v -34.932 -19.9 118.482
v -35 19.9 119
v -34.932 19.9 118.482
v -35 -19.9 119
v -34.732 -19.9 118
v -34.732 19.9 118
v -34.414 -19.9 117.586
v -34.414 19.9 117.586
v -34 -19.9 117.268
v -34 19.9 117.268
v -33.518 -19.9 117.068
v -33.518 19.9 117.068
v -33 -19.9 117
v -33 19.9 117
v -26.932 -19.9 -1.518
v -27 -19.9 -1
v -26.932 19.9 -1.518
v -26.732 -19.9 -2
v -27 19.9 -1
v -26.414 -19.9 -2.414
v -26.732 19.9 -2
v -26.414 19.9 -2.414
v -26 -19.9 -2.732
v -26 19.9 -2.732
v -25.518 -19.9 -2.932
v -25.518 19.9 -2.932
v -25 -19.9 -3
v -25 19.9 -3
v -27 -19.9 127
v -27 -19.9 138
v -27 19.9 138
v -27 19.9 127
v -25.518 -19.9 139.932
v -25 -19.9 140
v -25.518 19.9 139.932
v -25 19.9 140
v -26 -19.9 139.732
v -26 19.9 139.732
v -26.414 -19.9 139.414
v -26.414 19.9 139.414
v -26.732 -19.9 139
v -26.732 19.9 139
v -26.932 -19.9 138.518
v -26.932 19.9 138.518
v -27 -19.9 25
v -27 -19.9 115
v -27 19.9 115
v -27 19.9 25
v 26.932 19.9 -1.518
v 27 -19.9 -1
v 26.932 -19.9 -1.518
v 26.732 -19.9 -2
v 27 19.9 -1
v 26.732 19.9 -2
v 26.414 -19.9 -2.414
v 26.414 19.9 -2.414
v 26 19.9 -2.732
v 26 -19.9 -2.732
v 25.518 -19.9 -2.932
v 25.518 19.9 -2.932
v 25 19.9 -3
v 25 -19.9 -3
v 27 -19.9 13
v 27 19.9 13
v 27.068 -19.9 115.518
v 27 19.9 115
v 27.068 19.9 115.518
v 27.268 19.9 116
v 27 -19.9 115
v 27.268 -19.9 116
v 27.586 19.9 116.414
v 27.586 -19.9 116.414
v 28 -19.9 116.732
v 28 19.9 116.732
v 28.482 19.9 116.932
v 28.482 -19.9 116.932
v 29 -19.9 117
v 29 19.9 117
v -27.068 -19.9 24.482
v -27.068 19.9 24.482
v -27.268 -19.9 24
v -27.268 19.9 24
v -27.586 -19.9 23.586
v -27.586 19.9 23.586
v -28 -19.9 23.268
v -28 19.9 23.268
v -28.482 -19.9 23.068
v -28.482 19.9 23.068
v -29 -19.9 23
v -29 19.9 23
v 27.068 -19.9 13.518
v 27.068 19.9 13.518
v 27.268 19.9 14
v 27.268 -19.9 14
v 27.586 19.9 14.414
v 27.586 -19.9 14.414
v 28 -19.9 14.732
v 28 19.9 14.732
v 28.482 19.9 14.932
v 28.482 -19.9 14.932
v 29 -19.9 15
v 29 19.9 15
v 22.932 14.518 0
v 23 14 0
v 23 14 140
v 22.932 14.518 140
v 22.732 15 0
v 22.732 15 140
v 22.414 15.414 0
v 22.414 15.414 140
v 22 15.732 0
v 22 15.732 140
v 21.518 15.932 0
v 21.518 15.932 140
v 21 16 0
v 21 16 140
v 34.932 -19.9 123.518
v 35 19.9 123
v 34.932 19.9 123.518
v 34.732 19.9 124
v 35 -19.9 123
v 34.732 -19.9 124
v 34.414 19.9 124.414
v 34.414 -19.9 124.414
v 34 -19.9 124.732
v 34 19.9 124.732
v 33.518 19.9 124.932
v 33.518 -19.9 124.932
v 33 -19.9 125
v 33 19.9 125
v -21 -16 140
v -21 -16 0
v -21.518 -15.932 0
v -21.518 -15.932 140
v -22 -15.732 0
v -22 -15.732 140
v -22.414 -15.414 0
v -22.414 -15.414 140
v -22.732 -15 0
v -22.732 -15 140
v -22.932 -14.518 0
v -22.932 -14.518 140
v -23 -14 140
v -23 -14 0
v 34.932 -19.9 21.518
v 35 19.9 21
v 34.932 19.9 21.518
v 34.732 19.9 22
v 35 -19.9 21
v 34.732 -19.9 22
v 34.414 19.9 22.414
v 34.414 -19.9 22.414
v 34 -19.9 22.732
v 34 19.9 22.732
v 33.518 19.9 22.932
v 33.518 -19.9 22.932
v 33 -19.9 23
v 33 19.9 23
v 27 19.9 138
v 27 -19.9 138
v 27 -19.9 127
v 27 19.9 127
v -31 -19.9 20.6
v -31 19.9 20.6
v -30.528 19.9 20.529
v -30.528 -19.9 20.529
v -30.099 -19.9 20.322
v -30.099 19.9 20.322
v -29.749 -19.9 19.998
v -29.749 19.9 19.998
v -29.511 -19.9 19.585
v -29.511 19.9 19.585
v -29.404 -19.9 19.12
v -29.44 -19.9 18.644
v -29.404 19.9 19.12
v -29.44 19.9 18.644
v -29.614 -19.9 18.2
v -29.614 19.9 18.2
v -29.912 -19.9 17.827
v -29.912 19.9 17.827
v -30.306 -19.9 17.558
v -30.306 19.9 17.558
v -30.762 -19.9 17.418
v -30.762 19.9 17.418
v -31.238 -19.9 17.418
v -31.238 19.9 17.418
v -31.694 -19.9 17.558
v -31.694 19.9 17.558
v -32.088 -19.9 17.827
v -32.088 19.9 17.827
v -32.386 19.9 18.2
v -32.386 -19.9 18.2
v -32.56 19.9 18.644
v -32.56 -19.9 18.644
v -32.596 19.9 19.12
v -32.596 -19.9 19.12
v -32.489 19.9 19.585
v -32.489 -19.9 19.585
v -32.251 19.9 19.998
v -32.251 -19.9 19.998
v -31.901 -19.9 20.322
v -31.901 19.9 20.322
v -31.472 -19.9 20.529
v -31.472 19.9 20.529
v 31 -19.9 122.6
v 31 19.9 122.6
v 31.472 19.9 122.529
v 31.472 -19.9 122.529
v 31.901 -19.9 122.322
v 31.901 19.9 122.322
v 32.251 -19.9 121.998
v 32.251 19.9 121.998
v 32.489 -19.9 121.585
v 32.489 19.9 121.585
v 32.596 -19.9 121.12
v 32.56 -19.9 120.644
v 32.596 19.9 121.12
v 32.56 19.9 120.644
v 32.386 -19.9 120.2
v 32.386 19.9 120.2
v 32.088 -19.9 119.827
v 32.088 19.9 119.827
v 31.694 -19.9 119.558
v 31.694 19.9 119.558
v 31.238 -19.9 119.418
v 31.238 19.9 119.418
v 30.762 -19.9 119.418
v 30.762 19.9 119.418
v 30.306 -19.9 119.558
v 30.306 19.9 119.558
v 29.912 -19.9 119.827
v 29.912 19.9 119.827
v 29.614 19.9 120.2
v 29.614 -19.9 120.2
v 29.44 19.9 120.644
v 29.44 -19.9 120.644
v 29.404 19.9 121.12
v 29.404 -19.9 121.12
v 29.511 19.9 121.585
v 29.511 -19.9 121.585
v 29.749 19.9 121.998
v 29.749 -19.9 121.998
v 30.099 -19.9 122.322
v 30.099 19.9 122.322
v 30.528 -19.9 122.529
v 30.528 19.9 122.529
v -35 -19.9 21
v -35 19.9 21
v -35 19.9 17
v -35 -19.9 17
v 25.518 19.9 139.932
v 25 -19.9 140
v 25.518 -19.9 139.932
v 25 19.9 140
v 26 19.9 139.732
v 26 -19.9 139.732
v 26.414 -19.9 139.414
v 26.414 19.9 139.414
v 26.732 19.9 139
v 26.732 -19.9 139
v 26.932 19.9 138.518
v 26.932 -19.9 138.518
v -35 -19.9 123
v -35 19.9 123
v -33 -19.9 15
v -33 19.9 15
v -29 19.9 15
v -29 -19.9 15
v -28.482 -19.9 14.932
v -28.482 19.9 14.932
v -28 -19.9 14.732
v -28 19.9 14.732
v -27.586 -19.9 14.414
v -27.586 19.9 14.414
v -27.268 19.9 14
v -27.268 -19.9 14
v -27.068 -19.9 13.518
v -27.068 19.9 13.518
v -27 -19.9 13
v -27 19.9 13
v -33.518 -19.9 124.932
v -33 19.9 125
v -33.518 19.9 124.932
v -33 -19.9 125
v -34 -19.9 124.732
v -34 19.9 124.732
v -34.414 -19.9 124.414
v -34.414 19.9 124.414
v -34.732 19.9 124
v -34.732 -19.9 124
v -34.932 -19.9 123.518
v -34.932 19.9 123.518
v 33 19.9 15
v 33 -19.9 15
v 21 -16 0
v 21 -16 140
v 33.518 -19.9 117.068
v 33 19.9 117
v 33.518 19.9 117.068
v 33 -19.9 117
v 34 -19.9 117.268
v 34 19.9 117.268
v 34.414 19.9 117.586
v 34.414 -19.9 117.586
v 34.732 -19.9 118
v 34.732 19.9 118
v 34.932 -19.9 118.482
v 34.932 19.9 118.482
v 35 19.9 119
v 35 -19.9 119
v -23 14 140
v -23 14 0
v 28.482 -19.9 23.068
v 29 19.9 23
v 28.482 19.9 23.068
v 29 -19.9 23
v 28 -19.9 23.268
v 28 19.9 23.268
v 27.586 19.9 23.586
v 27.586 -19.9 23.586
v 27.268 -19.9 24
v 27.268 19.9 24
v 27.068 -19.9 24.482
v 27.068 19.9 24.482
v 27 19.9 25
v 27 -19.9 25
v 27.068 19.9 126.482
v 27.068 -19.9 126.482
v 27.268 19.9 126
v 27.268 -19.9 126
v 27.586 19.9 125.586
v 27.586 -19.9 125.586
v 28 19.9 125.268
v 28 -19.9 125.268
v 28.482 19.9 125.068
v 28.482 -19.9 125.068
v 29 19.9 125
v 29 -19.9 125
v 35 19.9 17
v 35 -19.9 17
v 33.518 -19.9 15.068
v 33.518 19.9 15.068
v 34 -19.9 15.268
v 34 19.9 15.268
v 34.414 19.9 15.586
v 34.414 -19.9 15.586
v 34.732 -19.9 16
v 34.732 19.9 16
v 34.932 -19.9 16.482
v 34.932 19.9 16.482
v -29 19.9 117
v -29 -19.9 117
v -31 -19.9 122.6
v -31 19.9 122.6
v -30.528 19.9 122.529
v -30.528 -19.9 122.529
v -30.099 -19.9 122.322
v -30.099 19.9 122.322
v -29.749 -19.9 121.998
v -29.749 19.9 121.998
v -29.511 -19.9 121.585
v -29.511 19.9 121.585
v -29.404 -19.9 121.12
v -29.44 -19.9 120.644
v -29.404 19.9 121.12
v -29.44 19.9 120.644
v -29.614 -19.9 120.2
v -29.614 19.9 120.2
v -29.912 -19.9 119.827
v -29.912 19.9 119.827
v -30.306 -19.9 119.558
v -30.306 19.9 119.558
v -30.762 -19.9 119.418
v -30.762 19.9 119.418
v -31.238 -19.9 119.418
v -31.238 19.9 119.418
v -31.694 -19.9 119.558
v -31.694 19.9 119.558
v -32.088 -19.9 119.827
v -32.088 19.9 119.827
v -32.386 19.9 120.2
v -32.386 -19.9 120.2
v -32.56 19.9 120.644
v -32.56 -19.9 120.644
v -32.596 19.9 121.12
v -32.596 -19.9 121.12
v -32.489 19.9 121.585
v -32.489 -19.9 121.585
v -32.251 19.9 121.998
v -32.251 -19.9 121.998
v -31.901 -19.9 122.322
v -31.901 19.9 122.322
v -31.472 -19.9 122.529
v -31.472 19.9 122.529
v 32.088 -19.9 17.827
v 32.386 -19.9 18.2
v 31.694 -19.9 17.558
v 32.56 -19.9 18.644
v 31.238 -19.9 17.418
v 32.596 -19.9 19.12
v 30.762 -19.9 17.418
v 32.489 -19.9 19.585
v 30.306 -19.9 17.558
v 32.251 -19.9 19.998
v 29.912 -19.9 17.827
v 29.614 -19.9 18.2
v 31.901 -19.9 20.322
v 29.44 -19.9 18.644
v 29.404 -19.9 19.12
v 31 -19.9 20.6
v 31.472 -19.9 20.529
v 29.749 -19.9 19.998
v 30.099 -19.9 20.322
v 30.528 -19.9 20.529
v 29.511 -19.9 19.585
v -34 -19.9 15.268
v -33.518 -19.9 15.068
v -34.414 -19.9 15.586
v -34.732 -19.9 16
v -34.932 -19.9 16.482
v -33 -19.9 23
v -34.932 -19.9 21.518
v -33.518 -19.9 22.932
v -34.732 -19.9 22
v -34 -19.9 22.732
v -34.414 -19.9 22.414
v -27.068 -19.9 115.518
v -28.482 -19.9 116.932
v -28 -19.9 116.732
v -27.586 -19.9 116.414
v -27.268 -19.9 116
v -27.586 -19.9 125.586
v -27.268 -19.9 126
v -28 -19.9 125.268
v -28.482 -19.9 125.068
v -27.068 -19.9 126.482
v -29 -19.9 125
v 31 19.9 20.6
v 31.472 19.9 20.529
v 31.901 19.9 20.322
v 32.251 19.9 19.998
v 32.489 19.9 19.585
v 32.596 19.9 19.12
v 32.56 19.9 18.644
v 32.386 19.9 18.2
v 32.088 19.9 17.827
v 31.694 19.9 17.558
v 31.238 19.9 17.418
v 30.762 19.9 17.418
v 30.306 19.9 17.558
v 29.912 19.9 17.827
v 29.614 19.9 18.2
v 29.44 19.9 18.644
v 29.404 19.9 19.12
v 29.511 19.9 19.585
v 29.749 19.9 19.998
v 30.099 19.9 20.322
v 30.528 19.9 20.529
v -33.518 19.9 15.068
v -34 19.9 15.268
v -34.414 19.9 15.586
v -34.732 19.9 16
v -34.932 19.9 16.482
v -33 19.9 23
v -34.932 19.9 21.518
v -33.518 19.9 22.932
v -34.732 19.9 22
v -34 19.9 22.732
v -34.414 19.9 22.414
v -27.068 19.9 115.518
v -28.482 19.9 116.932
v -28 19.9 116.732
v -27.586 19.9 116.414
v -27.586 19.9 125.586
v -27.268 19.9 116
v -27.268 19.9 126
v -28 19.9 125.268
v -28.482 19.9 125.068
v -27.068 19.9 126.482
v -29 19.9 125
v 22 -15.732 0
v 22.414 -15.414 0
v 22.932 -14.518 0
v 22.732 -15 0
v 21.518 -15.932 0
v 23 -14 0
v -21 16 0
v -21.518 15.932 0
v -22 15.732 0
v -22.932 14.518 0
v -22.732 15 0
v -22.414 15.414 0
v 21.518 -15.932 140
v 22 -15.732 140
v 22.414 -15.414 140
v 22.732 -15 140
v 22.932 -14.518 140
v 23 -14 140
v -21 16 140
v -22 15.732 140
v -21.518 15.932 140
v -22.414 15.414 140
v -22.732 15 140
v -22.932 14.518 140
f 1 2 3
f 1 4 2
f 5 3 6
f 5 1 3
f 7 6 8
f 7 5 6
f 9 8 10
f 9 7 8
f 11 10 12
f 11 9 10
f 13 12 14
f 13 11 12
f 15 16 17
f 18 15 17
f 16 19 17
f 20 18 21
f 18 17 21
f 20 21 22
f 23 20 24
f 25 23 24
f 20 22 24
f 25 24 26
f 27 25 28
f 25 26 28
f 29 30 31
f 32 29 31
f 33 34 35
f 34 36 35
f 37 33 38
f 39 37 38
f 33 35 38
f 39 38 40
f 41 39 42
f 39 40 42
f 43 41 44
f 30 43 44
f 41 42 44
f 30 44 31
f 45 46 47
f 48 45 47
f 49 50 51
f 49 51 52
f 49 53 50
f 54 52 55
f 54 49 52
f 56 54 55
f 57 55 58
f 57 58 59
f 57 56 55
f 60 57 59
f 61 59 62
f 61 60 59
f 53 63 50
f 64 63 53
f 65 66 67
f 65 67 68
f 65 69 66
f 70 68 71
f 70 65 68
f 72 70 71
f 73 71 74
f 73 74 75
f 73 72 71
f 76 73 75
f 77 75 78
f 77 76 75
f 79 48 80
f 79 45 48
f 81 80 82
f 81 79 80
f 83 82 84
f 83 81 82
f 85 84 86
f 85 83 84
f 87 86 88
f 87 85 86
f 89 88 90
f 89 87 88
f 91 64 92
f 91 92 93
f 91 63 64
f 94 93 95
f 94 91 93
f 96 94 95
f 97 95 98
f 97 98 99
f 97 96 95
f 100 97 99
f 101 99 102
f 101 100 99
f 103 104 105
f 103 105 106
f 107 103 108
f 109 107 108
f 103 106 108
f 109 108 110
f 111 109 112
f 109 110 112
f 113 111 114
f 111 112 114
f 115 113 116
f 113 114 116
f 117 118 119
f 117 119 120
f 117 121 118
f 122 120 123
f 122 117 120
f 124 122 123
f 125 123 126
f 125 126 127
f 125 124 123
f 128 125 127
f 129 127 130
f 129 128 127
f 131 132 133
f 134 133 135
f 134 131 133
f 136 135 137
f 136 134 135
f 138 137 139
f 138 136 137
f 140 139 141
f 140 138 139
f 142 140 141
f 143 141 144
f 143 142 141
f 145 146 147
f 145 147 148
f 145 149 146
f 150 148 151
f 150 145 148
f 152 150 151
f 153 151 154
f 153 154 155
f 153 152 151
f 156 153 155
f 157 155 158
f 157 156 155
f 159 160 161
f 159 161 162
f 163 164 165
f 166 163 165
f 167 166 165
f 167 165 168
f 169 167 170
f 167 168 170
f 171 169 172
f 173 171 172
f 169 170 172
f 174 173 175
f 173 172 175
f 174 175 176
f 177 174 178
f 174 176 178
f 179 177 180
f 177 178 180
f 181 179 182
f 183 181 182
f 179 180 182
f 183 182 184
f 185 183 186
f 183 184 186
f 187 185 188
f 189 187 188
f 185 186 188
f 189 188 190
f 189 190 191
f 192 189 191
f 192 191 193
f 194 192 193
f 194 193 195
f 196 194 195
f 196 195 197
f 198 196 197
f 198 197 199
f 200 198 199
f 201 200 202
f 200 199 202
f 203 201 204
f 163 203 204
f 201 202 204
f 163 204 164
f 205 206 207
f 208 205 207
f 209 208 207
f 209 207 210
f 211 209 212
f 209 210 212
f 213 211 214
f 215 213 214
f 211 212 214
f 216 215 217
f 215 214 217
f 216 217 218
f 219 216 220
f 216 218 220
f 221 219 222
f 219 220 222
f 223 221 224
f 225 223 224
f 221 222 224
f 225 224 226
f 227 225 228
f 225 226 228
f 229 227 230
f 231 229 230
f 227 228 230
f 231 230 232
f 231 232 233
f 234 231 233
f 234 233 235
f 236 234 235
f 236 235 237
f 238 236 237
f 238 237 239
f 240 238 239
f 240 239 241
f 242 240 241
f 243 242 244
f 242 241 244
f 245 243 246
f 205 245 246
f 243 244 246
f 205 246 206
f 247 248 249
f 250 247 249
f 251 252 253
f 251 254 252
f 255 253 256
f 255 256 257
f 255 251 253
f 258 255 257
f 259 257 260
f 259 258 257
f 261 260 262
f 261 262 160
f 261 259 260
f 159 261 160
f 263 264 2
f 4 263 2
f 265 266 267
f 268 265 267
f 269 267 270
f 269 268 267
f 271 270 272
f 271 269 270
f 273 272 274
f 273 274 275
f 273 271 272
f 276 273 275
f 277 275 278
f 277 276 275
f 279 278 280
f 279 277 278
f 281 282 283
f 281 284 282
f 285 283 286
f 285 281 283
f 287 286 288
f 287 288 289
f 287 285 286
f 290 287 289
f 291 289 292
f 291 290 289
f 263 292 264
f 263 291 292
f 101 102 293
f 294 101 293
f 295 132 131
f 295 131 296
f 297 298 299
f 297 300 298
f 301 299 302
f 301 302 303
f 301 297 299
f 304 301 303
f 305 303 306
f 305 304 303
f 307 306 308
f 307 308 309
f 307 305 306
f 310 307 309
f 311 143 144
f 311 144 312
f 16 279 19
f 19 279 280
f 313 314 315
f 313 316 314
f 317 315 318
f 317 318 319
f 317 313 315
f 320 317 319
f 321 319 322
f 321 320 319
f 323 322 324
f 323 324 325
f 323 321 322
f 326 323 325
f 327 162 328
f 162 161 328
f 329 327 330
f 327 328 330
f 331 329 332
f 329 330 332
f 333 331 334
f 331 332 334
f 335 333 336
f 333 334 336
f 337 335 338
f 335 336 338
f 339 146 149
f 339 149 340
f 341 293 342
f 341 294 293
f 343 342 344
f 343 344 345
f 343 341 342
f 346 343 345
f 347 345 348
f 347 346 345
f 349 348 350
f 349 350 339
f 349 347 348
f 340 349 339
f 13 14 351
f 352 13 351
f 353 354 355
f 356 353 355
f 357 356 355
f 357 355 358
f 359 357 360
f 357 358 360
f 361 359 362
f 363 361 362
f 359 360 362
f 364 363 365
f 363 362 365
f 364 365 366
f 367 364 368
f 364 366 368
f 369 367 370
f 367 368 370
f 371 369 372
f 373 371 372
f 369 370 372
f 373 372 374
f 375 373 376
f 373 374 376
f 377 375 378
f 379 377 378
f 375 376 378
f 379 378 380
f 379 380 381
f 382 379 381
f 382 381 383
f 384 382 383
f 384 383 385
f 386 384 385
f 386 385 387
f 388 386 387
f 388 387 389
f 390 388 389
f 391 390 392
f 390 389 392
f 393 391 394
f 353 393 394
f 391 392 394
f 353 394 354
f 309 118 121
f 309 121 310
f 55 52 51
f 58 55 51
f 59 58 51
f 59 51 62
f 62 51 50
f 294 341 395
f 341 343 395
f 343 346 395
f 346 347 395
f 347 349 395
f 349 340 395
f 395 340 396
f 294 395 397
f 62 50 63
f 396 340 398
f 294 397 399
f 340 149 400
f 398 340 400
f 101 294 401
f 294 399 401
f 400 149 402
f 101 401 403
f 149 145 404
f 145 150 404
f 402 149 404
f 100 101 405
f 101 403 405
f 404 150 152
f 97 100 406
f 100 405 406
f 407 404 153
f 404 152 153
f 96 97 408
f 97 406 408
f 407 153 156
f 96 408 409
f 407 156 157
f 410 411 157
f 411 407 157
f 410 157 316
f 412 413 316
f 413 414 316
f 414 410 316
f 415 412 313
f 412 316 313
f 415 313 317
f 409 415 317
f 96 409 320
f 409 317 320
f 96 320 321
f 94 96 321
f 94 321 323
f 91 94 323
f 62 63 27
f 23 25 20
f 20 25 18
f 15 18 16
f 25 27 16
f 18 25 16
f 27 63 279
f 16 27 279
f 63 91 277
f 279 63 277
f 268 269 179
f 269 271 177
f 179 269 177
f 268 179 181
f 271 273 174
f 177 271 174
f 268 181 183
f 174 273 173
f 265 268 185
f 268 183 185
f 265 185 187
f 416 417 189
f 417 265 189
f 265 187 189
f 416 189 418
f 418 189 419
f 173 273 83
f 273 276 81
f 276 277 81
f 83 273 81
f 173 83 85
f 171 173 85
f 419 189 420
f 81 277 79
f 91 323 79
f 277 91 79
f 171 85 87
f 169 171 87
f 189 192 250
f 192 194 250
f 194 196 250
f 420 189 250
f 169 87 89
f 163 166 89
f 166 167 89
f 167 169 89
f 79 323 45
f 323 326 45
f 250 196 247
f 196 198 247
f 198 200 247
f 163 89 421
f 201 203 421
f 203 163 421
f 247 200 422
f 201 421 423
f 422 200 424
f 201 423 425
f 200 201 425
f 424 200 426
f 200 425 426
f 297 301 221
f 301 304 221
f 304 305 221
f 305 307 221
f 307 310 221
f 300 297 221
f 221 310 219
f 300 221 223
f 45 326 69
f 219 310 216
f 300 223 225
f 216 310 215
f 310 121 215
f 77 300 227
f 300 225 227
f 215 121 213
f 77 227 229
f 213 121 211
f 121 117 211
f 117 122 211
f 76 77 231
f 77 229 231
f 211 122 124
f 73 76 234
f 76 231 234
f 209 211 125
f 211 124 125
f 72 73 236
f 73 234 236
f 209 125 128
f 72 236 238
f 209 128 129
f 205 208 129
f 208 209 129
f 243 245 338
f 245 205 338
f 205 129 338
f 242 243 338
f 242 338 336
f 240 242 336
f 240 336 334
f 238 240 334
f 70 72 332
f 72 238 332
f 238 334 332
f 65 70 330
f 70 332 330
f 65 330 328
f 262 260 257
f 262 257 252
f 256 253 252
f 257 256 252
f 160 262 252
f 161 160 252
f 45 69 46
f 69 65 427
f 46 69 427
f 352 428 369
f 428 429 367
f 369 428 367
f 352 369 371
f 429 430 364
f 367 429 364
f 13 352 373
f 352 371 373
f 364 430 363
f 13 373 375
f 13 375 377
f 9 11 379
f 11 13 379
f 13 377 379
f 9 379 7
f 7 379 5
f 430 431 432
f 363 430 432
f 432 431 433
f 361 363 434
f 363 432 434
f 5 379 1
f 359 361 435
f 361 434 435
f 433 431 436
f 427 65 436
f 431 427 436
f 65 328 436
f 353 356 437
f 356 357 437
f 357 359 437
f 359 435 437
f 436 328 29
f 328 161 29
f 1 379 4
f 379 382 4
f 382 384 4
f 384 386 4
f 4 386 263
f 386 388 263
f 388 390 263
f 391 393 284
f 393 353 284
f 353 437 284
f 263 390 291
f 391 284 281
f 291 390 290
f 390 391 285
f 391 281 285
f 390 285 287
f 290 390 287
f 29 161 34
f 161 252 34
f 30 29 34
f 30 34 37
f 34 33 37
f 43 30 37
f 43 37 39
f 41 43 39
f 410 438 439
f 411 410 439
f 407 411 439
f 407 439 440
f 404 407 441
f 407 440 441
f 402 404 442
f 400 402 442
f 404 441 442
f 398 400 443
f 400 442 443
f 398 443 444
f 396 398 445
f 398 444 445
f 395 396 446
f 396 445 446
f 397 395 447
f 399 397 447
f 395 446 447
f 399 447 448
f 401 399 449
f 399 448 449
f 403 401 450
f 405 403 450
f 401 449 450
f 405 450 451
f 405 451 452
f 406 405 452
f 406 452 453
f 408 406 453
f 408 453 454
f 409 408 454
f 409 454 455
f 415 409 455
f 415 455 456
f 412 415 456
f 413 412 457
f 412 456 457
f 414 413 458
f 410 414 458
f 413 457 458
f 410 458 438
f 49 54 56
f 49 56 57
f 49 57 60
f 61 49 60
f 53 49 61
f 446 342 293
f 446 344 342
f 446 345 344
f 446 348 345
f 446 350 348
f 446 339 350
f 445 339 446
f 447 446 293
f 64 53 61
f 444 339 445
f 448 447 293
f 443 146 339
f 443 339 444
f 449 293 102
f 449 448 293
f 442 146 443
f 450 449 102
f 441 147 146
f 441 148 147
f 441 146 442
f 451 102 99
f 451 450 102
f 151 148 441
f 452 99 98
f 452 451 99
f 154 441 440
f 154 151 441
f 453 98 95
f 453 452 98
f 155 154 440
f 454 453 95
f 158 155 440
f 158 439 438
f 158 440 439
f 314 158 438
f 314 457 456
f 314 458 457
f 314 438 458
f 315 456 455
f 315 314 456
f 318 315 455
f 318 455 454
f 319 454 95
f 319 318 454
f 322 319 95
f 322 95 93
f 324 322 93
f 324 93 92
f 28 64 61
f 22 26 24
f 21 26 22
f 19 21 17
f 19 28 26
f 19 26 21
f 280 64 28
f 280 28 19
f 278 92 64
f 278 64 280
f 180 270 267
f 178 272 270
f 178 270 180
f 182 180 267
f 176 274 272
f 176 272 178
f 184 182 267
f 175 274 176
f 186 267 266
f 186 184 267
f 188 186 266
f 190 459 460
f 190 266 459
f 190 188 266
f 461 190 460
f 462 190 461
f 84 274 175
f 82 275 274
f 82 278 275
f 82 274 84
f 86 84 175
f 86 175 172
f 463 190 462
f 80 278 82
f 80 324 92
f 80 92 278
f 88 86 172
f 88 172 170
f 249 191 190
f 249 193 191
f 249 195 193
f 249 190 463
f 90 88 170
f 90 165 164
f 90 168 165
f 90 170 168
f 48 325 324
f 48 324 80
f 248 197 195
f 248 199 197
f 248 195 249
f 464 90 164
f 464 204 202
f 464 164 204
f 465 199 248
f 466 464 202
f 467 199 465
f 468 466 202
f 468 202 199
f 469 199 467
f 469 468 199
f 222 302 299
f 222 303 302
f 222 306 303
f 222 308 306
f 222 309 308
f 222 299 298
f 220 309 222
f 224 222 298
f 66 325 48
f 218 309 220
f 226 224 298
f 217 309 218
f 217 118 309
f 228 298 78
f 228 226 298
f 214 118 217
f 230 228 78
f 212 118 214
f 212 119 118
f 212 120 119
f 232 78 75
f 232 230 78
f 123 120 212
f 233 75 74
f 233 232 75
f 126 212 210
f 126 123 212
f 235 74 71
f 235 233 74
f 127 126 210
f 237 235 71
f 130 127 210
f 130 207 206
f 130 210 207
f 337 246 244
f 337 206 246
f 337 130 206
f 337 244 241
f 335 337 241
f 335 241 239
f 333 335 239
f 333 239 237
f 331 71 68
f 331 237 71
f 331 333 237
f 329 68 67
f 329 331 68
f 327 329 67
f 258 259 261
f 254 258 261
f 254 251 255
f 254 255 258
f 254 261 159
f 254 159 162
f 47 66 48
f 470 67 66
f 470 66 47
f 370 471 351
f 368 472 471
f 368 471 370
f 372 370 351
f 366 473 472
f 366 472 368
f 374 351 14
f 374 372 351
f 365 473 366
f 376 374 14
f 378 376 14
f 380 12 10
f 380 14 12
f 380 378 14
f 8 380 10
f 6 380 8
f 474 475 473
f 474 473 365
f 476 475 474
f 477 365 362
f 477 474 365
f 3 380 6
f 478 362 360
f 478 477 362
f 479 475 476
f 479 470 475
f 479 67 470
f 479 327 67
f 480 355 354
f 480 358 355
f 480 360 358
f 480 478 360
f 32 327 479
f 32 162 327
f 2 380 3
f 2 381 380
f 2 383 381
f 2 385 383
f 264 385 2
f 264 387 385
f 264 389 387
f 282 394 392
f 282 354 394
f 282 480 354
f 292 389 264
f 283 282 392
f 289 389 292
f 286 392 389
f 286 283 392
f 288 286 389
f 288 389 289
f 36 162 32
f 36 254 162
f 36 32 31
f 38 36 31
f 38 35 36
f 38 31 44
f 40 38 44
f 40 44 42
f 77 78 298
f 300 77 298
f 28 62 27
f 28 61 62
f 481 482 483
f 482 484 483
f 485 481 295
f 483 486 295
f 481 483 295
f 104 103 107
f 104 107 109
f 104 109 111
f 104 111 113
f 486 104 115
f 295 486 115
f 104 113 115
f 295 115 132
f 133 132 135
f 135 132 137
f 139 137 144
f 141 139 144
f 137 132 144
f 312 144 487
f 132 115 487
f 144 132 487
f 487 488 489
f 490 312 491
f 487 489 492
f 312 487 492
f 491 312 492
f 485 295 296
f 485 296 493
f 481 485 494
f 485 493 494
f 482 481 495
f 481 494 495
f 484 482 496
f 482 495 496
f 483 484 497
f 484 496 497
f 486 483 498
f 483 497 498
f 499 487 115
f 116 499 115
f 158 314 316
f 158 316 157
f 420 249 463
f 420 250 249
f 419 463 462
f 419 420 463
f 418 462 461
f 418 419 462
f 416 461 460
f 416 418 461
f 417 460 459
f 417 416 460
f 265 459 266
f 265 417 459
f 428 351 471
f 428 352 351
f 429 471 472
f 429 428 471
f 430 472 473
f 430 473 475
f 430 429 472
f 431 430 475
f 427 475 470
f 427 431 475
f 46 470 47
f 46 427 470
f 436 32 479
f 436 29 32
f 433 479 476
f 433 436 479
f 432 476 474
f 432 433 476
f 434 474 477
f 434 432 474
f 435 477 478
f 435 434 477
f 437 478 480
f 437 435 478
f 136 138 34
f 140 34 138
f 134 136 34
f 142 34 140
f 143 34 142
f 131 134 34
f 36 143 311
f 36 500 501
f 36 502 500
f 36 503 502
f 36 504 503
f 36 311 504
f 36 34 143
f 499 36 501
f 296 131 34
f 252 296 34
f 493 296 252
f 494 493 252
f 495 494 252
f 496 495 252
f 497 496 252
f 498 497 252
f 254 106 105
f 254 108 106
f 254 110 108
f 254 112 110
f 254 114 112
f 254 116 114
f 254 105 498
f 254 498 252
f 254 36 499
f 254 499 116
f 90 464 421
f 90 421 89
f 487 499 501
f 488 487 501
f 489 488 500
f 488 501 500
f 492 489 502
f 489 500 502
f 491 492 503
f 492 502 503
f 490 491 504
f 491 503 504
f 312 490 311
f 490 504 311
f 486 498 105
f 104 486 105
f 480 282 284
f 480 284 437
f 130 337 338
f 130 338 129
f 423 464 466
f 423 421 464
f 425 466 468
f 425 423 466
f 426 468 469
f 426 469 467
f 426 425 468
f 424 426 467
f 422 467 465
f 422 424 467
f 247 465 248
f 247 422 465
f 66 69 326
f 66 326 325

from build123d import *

# Parameters (mm, degrees)
SKETCH_1_W          = 54
SKETCH_1_H          = 39.8
SKETCH_1_W_2        = 46
SKETCH_1_H_2        = 32
EXTRUDE_1_DEPTH     = 143
SKETCH_3_W          = 54
SKETCH_3_H          = 39.8
EXTRUDE_2_DEPTH     = 3
SKETCH_4_W          = 8
SKETCH_4_H          = 8
SKETCH_4_R          = 1.6
EXTRUDE_3_DEPTH     = 39.8
FILLET_2_R          = 2
SKETCH_5_W          = 54
SKETCH_5_H          = 39.8
CUT_EXTRUDE_1_DEPTH = 3
FILLET_3_R          = 2


with BuildPart() as part:
    # 草图1 → 凸台-拉伸1 (new body)
    with BuildSketch(Plane.XY):
        Rectangle(SKETCH_1_W, SKETCH_1_H)
        Rectangle(SKETCH_1_W_2, SKETCH_1_H_2, mode=Mode.SUBTRACT)
    extrude(amount=EXTRUDE_1_DEPTH)

    # 草图3 → 凸台-拉伸2 (add)
    with BuildSketch(Plane(origin=(0, 0, 0), x_dir=(-1, 0, 0), z_dir=(0, 0, -1))):
        Rectangle(SKETCH_3_W, SKETCH_3_H)
    extrude(amount=EXTRUDE_2_DEPTH)

    # 草图4 → 凸台-拉伸3 (add)
    # profile 1 of 4: a face of its own
    with BuildSketch(Plane(origin=(0, 19.9, 0), x_dir=(1, 0, 0), z_dir=(0, 1, 0))):
        with Locations((-31, -121)):
            Rectangle(SKETCH_4_W, SKETCH_4_H)
        with Locations(Location((-31, -121, 0), (0, 0, 270))):
            Circle(SKETCH_4_R, mode=Mode.SUBTRACT)
    # profile 2 of 4: a face of its own
    with BuildSketch(Plane(origin=(0, 19.9, 0), x_dir=(1, 0, 0), z_dir=(0, 1, 0))):
        with Locations((31, -121)):
            Rectangle(SKETCH_4_W, SKETCH_4_H)
        with Locations(Location((31, -121, 0), (0, 0, 270))):
            Circle(SKETCH_4_R, mode=Mode.SUBTRACT)
    # profile 3 of 4: a face of its own
    with BuildSketch(Plane(origin=(0, 19.9, 0), x_dir=(1, 0, 0), z_dir=(0, 1, 0))):
        with Locations((31, -19)):
            Rectangle(SKETCH_4_W, SKETCH_4_H)
        with Locations(Location((31, -19, 0), (0, 0, 270))):
            Circle(SKETCH_4_R, mode=Mode.SUBTRACT)
    # profile 4 of 4: a face of its own
    with BuildSketch(Plane(origin=(0, 19.9, 0), x_dir=(1, 0, 0), z_dir=(0, 1, 0))):
        with Locations((-31, -19)):
            Rectangle(SKETCH_4_W, SKETCH_4_H)
        with Locations(Location((-31, -19, 0), (0, 0, 270))):
            Circle(SKETCH_4_R, mode=Mode.SUBTRACT)
    extrude(amount=-EXTRUDE_3_DEPTH)

    # 圆角2
    fillet_2_edges = [part.edges().sort_by_distance(p)[0] for p in [
        (23, -16, 71.5),
        (23, 16, 71.5),
        (-23, 16, 71.5),
        (-23, -16, 71.5),
    ]]
    fillet(fillet_2_edges, radius=FILLET_2_R)

    # 草图5 → 切除-拉伸1 (cut)
    with BuildSketch(Plane.XY.offset(143)):
        Rectangle(SKETCH_5_W, SKETCH_5_H)
    extrude(amount=-CUT_EXTRUDE_1_DEPTH, mode=Mode.SUBTRACT)

    # 圆角3
    fillet_3_edges = [part.edges().sort_by_distance(p)[0] for p in [
        (-27, 0, 140),
        (27, 0, 140),
        (27, 0, -3),
        (-27, 0, -3),
        (27, 0, 125),
        (27, 0, 117),
        (35, 0, 117),
        (35, 0, 125),
        (-27, 0, 117),
        (-27, 0, 125),
        (-35, 0, 125),
        (-35, 0, 117),
        (27, 0, 23),
        (27, 0, 15),
        (35, 0, 15),
        (35, 0, 23),
        (-35, 0, 15),
        (-27, 0, 15),
        (-27, 0, 23),
        (-35, 0, 23),
    ]]
    fillet(fillet_3_edges, radius=FILLET_3_R)


solid = part.part
